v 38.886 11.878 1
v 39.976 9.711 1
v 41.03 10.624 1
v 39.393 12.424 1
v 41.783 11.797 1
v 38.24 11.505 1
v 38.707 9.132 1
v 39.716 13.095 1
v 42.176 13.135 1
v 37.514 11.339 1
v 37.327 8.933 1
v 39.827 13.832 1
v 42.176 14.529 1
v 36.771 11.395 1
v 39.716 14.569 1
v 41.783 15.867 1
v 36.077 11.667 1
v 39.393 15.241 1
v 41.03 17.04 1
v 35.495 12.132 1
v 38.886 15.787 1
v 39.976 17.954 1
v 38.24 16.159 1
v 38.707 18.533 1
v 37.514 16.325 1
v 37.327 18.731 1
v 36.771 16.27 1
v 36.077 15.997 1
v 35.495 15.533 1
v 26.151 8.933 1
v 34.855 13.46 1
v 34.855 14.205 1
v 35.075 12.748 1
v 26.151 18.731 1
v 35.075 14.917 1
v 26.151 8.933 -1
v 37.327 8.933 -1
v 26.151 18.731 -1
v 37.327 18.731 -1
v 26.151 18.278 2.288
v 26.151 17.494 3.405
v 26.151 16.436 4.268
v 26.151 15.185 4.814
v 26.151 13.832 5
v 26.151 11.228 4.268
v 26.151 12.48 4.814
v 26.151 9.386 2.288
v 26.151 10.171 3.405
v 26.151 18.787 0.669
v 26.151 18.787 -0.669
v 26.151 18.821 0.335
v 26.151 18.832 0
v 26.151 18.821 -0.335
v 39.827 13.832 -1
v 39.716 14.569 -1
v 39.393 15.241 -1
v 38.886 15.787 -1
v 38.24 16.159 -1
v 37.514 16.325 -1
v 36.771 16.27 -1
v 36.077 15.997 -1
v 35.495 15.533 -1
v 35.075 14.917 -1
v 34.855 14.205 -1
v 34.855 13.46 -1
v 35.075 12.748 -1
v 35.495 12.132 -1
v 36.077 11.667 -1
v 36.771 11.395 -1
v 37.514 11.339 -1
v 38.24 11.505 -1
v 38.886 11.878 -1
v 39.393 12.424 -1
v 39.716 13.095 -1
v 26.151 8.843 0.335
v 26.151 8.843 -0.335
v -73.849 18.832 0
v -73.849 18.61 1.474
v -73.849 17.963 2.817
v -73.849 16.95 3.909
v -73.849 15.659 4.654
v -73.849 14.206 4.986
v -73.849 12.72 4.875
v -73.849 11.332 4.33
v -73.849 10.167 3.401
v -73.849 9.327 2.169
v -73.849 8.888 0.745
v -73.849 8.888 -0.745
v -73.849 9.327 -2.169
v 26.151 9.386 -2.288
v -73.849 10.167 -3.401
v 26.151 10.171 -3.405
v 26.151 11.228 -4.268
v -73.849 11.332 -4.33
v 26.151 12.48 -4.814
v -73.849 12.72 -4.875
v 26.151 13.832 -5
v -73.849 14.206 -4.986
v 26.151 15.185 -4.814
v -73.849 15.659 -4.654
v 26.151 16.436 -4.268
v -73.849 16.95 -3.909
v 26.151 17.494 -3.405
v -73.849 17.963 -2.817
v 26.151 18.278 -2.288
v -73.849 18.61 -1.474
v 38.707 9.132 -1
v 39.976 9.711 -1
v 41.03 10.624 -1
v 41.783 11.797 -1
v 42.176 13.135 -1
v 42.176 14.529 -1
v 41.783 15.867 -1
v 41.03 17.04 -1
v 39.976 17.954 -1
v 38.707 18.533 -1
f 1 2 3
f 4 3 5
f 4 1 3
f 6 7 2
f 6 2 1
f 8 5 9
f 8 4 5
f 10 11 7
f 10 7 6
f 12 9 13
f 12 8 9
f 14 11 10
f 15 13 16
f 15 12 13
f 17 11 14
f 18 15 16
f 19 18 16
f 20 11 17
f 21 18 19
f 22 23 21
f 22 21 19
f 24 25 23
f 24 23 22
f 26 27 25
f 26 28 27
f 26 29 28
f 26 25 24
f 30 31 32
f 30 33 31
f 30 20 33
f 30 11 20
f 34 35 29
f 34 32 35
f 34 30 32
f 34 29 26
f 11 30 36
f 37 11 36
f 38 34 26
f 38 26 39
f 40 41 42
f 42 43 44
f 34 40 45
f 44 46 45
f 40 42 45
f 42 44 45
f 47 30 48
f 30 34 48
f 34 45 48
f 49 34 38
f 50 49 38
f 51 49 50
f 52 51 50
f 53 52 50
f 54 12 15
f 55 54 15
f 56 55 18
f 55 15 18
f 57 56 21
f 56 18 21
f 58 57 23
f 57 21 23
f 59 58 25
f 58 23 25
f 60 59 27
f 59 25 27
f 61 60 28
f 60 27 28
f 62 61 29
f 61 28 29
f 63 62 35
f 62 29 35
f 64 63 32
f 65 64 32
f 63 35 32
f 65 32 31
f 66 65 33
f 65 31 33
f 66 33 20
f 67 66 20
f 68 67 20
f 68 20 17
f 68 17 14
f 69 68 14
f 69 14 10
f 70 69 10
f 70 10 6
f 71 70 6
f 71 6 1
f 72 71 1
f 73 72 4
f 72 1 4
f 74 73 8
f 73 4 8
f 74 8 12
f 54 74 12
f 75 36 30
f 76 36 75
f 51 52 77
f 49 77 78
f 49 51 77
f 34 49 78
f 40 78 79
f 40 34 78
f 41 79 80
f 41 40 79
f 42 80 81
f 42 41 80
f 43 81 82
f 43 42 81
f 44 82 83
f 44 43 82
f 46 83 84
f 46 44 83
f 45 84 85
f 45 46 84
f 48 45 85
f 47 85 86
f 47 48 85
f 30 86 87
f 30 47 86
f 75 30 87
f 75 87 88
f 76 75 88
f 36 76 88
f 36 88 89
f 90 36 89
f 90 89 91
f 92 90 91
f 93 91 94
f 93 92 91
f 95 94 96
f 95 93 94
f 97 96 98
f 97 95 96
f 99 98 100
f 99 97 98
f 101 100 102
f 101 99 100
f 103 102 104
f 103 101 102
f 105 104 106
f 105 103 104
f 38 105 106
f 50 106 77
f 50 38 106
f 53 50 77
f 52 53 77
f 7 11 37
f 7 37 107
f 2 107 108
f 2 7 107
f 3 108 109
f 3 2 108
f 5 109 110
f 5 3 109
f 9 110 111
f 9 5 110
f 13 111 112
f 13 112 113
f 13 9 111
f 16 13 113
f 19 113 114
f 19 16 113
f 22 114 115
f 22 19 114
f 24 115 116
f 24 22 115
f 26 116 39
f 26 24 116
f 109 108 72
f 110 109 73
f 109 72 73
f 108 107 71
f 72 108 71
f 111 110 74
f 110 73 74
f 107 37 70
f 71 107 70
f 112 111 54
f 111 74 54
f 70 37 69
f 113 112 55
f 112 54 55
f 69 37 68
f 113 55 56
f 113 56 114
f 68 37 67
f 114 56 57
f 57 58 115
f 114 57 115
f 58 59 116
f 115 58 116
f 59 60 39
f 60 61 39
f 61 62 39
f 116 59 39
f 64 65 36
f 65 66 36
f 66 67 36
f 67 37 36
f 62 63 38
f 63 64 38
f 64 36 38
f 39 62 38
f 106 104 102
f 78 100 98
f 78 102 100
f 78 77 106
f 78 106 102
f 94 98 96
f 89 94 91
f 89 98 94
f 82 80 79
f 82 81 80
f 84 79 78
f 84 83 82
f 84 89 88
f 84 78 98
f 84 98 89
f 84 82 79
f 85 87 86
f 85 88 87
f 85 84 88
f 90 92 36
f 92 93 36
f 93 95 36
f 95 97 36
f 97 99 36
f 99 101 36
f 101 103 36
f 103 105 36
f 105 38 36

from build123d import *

# Parameters (mm, degrees)
SKETCH1_W           = 100
SKETCH1_H           = 5
SKETCH4_W           = 2
SKETCH4_H           = 9.797958971
BOSS_EXTRUDE4_DEPTH = 20
CUT_EXTRUDE5_DEPTH  = 2
SKETCH11_R          = 2.5
CUT_EXTRUDE6_DEPTH  = 2


with BuildPart() as part:
    # Sketch1 → Revolve1 (revolve)
    with BuildSketch(Plane.XY):
        with Locations((-23.848684211, 16.332236842)):
            Rectangle(SKETCH1_W, SKETCH1_H)
    revolve(axis=Axis((-73.848684211, 13.832236842, 0), (1, 0, 0)))

    # Sketch4 → Boss-Extrude4 (add)
    with BuildSketch(Plane(origin=(26.151315789, 0, 0), x_dir=(0, 0, -1), z_dir=(1, 0, 0))):
        with Locations((0, 13.832236843)):
            Rectangle(SKETCH4_W, SKETCH4_H)
    extrude(amount=BOSS_EXTRUDE4_DEPTH)

    # Sketch10 → Cut-Extrude5 (cut)
    with BuildSketch(Plane.XY.offset(1)):
        with BuildLine():
            Line((37.327139049, 18.731216328), (46.151315789, 18.731216328))
            Line((46.151315789, 18.731216328), (46.151315789, 8.933257357))
            Line((46.151315789, 8.933257357), (37.327139049, 8.933257357))
            ThreePointArc((37.327139049, 8.933257357), (42.226118535, 13.832236842), (37.327139049, 18.731216328))
        make_face()
    extrude(amount=-CUT_EXTRUDE5_DEPTH, mode=Mode.SUBTRACT)

    # Sketch11 → Cut-Extrude6 (cut)
    with BuildSketch(Plane.XY.offset(1)):
        with Locations((37.327139049, 13.832236842)):
            Circle(SKETCH11_R)
    extrude(amount=-CUT_EXTRUDE6_DEPTH, mode=Mode.SUBTRACT)


solid = part.part
